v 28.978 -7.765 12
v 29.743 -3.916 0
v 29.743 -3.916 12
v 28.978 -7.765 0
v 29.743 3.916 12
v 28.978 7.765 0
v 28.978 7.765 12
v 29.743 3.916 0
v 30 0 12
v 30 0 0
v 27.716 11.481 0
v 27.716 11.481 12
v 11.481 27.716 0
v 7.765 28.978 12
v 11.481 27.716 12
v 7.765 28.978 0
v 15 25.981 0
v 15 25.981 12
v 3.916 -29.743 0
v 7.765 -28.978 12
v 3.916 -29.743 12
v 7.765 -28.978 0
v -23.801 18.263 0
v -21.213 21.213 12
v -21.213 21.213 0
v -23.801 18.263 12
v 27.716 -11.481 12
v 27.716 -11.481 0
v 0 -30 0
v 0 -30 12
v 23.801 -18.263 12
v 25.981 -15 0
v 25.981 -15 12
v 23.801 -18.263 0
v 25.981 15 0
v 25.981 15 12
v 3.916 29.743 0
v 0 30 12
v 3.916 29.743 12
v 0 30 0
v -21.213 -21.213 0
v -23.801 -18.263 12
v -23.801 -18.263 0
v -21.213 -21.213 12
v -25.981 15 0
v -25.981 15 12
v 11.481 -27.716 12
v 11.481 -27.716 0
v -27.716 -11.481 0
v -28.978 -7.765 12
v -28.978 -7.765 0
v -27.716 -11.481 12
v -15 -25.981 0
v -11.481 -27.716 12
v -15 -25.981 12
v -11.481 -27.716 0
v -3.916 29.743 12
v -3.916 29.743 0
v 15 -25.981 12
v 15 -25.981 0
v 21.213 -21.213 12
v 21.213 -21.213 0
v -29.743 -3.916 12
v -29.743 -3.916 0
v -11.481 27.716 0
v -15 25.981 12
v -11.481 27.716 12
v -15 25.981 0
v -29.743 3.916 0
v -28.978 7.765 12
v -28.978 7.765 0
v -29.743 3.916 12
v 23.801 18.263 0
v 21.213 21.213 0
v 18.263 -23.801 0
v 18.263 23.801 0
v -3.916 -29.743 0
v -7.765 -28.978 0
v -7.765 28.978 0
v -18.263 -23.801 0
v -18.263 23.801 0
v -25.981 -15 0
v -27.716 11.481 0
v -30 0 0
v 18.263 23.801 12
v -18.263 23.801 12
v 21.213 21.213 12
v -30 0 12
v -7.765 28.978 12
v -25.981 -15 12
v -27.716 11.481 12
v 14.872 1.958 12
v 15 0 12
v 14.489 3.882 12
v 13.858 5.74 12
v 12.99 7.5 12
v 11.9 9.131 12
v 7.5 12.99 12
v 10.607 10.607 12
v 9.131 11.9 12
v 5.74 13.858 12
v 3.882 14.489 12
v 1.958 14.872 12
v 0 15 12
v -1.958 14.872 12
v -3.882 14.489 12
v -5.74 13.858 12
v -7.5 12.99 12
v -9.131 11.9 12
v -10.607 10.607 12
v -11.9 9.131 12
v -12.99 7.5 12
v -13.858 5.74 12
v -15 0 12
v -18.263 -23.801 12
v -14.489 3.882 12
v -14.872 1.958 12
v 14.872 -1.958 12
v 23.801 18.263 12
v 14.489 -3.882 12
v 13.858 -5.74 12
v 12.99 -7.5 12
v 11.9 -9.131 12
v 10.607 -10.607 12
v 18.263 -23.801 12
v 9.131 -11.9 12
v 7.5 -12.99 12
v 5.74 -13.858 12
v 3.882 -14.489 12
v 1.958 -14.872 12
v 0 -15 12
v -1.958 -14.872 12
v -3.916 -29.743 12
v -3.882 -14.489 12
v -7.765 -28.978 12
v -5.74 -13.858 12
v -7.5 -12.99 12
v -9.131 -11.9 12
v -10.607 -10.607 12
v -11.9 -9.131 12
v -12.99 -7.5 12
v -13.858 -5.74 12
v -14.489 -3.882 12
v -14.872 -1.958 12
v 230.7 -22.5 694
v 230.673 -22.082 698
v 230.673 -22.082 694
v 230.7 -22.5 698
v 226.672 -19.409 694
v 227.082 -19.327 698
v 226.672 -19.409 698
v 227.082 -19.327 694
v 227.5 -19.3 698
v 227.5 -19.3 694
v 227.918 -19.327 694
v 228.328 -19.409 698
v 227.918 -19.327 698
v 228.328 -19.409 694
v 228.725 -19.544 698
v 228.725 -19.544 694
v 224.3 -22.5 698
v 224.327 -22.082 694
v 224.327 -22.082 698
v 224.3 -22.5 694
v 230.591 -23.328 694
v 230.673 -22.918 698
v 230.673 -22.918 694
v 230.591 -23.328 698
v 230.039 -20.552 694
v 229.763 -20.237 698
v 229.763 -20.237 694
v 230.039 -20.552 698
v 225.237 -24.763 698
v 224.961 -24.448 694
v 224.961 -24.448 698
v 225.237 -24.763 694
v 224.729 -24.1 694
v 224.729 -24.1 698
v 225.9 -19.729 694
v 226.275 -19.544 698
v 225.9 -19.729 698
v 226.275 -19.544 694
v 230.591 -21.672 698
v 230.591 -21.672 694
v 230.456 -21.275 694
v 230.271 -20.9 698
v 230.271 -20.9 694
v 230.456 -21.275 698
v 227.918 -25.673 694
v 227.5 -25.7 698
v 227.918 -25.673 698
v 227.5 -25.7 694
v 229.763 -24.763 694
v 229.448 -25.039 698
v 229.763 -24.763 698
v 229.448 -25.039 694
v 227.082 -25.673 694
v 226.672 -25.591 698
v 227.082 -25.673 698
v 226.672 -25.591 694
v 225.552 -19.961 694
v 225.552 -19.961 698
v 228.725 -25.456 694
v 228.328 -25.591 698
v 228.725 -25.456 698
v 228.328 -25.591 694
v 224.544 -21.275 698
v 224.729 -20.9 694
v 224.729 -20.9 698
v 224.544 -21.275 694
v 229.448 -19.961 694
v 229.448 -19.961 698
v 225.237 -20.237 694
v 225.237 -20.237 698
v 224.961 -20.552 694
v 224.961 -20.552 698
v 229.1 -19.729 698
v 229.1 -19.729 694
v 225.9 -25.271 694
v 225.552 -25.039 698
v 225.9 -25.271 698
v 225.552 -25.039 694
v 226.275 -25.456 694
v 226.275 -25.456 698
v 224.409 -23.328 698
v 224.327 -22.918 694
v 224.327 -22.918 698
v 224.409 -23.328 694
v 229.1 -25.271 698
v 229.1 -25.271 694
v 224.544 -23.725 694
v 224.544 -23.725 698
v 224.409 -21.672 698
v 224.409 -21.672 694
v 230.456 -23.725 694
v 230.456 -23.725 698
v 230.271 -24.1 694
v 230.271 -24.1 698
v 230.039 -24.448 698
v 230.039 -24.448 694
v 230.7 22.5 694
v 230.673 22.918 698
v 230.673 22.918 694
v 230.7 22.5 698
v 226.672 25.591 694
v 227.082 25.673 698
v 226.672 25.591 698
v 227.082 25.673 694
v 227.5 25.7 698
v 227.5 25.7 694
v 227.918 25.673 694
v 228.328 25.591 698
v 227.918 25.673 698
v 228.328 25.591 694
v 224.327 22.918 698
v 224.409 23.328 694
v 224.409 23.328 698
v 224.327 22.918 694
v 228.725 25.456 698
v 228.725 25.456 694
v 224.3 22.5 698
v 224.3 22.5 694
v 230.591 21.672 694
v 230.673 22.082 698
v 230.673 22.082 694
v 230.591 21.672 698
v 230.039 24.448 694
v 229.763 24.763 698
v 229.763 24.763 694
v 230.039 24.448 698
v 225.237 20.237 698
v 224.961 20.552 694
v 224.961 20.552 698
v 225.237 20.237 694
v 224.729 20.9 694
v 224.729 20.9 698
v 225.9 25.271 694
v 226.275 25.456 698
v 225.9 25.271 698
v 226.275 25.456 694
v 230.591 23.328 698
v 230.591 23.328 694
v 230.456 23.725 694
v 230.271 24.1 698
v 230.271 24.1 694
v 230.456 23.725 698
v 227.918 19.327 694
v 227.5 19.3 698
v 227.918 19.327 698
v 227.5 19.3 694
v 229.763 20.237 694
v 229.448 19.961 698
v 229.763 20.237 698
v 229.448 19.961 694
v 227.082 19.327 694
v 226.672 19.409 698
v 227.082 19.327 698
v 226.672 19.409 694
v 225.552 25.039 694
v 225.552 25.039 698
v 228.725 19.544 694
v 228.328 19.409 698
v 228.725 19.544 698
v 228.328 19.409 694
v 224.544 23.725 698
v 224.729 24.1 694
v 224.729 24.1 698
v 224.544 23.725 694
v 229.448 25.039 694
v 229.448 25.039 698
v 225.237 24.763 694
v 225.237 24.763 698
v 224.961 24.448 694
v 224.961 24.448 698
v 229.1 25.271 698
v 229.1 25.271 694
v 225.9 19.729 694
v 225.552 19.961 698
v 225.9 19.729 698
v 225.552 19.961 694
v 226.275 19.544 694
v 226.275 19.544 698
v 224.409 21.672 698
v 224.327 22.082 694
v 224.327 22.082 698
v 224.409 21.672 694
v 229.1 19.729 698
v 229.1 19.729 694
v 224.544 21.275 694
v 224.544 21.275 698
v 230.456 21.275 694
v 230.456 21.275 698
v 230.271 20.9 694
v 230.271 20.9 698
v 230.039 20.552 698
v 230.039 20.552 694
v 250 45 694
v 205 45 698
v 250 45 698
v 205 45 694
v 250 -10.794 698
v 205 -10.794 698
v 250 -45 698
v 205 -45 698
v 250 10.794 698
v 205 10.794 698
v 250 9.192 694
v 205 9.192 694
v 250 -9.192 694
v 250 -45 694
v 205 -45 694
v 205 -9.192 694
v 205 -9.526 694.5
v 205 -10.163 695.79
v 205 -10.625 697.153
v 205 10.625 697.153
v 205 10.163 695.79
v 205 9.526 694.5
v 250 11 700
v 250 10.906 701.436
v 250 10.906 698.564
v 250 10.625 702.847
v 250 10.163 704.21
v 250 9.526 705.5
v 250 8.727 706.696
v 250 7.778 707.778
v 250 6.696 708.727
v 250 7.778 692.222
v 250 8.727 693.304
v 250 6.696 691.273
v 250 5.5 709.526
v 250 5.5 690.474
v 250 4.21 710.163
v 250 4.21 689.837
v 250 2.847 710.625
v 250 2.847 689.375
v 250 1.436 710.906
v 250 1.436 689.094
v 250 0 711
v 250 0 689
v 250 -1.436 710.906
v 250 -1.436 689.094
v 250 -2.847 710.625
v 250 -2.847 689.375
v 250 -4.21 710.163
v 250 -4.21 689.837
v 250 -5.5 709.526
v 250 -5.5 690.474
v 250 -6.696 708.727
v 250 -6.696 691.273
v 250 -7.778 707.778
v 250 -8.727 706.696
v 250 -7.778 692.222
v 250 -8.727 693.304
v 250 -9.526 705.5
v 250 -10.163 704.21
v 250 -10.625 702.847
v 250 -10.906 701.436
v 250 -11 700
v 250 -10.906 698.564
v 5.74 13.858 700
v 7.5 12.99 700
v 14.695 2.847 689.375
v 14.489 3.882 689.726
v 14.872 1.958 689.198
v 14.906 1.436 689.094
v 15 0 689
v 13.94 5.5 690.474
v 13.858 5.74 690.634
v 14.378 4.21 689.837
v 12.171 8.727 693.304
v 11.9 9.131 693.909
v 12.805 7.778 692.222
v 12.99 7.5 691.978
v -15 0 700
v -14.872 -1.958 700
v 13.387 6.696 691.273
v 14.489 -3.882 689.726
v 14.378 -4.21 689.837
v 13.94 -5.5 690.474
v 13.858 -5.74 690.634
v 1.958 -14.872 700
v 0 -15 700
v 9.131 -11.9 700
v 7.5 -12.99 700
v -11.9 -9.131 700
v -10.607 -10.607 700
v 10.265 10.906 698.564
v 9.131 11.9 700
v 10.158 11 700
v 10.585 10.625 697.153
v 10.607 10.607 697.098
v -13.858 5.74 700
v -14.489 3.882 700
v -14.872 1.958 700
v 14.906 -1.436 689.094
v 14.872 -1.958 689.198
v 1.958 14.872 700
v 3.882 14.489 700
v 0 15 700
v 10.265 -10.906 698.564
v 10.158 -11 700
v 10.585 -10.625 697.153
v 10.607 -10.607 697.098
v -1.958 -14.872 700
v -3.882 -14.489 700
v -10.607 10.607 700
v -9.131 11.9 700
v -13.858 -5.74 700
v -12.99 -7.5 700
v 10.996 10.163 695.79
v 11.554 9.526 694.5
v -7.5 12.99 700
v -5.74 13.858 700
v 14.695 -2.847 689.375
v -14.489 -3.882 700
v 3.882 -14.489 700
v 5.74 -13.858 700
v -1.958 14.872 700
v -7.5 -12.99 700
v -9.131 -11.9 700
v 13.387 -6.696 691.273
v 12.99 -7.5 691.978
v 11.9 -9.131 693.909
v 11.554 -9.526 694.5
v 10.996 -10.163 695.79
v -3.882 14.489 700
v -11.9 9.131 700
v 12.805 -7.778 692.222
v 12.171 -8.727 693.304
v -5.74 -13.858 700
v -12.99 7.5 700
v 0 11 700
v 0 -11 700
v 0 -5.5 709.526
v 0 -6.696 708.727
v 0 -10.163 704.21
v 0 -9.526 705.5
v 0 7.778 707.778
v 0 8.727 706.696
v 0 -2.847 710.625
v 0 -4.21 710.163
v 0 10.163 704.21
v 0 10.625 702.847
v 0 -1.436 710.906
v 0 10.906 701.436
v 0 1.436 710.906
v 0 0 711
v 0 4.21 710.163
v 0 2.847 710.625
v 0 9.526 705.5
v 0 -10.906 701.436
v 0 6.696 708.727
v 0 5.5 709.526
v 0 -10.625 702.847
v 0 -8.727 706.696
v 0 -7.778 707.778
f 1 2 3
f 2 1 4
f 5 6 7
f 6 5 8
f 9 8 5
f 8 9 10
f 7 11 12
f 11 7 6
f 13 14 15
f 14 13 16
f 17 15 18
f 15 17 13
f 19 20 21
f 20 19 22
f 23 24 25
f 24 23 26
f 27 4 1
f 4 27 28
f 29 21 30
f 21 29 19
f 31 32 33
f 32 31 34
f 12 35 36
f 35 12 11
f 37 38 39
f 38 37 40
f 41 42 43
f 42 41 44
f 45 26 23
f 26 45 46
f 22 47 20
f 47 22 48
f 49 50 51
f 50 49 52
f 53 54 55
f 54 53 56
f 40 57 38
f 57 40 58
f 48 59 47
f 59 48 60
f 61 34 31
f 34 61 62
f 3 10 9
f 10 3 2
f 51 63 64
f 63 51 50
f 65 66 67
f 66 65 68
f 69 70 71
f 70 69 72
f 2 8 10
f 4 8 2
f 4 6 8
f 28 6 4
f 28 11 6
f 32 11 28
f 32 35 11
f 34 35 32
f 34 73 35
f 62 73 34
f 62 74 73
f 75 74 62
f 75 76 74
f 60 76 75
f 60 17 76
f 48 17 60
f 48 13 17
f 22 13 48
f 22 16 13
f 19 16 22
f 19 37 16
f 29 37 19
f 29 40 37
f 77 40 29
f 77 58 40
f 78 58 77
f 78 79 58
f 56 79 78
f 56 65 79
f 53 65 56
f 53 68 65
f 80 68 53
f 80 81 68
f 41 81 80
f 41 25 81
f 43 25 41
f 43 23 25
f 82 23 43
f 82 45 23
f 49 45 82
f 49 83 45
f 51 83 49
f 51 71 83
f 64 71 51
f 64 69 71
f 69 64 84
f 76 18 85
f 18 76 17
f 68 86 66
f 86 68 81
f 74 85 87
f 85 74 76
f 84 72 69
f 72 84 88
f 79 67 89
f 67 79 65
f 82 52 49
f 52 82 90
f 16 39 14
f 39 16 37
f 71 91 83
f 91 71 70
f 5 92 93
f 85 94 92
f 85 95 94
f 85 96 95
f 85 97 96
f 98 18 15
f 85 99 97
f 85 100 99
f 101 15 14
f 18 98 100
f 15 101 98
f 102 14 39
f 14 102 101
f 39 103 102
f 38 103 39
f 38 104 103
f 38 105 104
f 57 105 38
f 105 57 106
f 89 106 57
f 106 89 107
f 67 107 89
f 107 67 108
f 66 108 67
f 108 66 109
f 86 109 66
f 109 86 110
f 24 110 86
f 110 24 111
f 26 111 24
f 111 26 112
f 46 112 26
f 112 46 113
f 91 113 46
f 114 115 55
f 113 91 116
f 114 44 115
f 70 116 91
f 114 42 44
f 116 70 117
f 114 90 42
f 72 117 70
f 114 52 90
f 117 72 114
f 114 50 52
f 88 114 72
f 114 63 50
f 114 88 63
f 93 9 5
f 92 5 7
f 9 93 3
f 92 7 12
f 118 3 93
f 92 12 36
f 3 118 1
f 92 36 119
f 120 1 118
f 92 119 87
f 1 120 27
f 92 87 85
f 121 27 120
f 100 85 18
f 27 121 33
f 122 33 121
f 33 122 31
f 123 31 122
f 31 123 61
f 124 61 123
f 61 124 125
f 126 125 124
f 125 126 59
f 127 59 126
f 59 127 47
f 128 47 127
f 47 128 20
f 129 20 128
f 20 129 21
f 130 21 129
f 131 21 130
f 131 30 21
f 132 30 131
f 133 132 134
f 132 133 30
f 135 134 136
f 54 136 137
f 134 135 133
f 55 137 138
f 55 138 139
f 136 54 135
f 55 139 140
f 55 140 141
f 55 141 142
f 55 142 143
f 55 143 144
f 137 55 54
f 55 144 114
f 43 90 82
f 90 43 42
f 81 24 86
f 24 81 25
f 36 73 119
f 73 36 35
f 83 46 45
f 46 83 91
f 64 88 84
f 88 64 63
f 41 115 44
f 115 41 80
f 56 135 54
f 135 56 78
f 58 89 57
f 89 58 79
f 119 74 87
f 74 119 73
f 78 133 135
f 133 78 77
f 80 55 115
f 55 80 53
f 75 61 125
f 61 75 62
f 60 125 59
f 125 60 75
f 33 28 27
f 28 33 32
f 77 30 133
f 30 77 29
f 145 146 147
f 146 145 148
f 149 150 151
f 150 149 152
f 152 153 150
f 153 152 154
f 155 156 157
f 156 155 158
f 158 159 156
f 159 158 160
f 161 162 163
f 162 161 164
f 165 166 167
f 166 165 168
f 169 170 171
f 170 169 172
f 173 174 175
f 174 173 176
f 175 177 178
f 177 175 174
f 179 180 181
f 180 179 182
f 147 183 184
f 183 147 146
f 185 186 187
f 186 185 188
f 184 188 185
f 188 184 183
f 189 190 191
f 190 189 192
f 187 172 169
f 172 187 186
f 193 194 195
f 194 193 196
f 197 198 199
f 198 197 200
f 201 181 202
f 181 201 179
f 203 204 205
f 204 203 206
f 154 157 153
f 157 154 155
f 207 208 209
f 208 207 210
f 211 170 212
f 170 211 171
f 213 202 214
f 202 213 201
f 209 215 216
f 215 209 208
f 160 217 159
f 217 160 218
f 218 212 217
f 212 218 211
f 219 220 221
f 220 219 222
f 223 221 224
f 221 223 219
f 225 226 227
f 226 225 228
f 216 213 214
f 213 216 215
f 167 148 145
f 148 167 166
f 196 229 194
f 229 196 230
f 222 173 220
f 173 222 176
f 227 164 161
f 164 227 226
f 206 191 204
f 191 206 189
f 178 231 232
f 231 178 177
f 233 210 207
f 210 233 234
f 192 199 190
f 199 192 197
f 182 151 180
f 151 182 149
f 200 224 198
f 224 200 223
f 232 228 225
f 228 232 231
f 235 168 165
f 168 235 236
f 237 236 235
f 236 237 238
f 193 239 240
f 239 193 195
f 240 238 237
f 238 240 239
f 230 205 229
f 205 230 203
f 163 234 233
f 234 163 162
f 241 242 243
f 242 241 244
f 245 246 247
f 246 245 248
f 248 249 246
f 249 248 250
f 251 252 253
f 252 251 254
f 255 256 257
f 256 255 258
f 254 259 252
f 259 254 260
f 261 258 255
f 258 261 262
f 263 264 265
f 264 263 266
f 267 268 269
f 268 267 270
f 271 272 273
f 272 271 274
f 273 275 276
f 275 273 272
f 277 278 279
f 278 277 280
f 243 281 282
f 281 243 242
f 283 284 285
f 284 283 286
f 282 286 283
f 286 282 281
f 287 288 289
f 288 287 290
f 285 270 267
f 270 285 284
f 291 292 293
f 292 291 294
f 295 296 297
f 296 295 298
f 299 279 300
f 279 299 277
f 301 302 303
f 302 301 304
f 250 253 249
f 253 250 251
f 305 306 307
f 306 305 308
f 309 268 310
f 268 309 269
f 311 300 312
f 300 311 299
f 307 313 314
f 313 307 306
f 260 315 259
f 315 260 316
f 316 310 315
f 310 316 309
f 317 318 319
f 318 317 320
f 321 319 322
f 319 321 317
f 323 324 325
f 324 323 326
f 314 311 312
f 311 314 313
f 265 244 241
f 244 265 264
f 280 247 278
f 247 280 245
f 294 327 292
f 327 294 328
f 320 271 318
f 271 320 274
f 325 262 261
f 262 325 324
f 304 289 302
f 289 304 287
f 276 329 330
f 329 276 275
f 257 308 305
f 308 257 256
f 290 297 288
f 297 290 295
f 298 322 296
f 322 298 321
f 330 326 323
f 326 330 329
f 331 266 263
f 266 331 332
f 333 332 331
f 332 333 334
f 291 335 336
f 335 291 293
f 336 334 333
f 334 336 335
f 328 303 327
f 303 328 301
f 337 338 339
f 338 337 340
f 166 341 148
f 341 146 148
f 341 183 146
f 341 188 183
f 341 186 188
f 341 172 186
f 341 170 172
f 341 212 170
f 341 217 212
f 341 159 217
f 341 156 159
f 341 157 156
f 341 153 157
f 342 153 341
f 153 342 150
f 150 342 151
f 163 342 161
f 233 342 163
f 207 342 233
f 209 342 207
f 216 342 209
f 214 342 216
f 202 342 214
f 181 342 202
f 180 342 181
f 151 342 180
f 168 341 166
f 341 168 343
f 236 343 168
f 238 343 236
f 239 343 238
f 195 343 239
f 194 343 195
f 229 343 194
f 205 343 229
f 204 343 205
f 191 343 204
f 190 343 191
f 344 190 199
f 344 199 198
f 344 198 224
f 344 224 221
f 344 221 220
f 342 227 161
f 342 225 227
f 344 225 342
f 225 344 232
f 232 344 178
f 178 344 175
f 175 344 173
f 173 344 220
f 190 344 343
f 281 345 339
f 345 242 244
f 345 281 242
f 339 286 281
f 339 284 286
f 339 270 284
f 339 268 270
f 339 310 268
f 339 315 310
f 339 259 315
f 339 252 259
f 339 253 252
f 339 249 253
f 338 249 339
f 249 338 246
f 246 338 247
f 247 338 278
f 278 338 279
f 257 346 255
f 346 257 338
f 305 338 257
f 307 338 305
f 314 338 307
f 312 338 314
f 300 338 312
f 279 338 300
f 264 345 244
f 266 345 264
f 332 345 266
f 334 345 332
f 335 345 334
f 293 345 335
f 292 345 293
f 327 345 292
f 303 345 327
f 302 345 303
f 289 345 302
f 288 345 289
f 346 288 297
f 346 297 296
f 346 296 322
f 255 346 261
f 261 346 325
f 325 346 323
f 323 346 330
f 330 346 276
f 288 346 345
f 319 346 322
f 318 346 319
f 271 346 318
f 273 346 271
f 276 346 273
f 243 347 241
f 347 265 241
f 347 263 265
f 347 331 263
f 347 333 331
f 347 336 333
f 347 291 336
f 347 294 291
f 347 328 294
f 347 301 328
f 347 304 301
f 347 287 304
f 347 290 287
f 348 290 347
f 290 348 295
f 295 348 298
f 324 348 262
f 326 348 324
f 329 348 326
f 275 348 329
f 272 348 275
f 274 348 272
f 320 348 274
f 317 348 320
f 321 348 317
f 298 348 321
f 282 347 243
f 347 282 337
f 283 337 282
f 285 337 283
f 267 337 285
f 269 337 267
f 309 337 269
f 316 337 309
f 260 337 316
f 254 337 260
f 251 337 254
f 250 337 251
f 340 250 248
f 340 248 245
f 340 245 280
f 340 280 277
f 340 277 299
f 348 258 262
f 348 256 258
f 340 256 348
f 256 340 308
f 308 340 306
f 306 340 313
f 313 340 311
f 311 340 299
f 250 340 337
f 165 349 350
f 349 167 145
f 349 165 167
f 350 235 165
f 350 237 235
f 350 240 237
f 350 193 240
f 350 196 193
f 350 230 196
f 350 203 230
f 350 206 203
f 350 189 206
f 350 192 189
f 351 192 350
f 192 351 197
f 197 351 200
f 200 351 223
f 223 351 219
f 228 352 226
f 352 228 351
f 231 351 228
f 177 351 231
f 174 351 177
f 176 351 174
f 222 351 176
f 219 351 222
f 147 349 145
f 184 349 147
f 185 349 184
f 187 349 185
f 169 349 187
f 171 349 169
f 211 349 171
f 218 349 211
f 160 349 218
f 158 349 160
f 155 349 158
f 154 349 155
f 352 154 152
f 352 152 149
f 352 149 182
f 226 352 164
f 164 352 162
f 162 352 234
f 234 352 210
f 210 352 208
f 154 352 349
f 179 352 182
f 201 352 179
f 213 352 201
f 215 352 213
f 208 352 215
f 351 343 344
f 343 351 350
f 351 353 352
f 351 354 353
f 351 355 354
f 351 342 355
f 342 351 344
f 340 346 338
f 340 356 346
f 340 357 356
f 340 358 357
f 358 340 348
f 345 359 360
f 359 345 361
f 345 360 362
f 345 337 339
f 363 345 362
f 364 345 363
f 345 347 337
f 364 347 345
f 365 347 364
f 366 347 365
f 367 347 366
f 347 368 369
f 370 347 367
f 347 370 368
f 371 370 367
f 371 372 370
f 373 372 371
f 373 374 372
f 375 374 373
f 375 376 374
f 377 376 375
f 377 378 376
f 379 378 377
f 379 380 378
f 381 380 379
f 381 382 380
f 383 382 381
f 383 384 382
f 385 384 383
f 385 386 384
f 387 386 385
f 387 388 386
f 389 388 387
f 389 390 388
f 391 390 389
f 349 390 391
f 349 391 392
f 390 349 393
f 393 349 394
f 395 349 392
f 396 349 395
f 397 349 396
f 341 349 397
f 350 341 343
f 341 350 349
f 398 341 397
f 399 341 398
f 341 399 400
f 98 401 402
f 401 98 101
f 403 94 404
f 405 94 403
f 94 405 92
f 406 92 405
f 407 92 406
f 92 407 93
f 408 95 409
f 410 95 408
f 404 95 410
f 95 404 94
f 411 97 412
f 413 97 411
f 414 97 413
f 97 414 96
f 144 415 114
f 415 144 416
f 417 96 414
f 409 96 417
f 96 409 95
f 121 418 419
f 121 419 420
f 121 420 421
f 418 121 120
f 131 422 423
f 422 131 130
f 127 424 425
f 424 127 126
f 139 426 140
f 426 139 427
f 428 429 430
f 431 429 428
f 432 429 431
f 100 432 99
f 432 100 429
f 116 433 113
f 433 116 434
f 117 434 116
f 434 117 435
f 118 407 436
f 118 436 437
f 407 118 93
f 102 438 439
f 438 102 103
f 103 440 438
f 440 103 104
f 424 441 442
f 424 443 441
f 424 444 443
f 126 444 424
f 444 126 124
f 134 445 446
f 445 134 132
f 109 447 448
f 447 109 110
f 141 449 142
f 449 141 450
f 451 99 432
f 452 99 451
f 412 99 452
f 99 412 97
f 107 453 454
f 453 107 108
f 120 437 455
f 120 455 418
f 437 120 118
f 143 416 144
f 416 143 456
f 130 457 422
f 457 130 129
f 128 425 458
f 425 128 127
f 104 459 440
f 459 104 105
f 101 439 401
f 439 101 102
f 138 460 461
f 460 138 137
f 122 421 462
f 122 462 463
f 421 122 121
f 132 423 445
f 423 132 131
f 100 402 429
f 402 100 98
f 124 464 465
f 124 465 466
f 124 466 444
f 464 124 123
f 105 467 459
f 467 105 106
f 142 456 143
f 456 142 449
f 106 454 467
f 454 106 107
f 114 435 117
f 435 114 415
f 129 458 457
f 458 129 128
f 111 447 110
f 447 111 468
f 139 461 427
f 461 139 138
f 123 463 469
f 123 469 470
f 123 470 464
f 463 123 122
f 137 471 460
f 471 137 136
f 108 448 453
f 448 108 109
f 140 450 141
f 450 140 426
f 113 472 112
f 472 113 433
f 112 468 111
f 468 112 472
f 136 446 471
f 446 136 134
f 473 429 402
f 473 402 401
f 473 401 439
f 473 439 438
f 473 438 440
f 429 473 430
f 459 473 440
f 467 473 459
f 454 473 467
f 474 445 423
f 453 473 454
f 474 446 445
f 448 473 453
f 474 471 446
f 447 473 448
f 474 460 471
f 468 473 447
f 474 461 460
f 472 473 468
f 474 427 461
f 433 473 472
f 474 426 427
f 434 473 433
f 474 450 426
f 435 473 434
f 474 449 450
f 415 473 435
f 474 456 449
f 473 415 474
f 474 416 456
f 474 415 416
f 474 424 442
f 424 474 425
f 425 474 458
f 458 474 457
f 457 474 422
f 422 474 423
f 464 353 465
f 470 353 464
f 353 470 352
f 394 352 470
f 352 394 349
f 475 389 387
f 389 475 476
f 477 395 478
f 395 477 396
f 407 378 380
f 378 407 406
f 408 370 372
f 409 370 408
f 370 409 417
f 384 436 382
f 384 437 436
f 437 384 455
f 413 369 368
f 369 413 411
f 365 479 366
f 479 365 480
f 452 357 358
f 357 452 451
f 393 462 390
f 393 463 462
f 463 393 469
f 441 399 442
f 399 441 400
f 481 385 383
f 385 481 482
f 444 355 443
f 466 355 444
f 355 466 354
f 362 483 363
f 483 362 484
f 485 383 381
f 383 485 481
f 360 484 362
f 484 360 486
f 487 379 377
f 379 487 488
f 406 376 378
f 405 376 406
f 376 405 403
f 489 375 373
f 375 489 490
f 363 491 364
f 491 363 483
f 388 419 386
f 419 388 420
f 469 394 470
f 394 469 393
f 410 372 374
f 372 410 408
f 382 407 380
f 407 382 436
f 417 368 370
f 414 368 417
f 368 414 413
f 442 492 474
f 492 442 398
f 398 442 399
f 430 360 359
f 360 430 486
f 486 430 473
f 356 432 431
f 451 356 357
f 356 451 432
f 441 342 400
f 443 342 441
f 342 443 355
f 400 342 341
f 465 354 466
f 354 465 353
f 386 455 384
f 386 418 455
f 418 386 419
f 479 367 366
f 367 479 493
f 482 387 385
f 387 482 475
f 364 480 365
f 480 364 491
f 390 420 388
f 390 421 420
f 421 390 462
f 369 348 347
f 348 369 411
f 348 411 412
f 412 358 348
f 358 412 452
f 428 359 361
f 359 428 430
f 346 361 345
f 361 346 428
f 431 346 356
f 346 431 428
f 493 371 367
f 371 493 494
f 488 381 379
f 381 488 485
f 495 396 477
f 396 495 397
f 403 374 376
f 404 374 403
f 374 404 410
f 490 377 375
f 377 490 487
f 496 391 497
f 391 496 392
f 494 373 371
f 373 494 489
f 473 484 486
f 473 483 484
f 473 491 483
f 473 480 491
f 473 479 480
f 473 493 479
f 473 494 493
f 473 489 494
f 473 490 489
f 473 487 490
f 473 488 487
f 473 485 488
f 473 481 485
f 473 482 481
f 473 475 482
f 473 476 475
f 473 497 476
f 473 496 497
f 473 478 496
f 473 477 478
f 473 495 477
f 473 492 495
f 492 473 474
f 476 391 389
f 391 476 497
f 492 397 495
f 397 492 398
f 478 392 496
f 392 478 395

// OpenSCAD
// file: params.scad
// Foldbot — parámetros globales compartidos (todas las medidas en mm)
// Editar aquí para ajustar el diseño sin tocar la geometría.

// ---------- Brazo (ver docs/02-mecanica-brazo.md) ----------
arm_L1      = 150;   // eslabón hombro -> codo
arm_L2      = 120;   // eslabón codo -> muñeca
arm_L3      = 90;    // muñeca -> punta de la pinza
arm_base_h  = 70;    // altura de la base hasta el eje del hombro
arm_link_w  = 24;    // ancho de los eslabones
arm_link_t  = 8;     // espesor de pared de los eslabones
arm_base_d  = 90;    // diámetro de la base rotatoria
servo_len   = 40.5;  // caja de servo estándar (MG996R)
servo_w     = 20;
servo_h     = 38;

// Pose de ejemplo para el ensamble de referencia (grados)
pose_shoulder = 35;
pose_elbow    = -60;
pose_wrist    = -25;

// ---------- Tablero de plegado (ver docs/03-mecanica-plegado.md) ----------
board_center_w   = 200;  // ancho panel central
board_center_h   = 300;  // alto panel central
board_side_w     = 100;  // ancho de cada solapa lateral
board_bottom_h   = 150;  // alto de la solapa inferior
board_thickness  = 5;    // espesor de panel
board_hinge_gap  = 1.5;  // holgura de bisagra entre paneles

// ---------- Soporte de cámara (ver docs/01 y 05) ----------
cam_height        = 700;  // altura cenital sobre la mesa (60-80 cm)
cam_arm_len       = 250;  // voladizo del brazo de la cámara
cam_post_d        = 30;   // diámetro del poste
cam_plate_w       = 90;   // placa de montaje de la cámara (D435 ~90x25)
cam_plate_h       = 25;

// ---------- Calidad de render ----------
$fn = 48;
// main file
// Foldbot — Soporte cenital de la cámara RGB-D (modelo paramétrico)
// Poste vertical + brazo en voladizo + placa de montaje mirando hacia abajo.

include <params.scad>;

part = "full";  // "full" | "plate"

module post() {
    color("slategray") cylinder(h = cam_height, r = cam_post_d/2);
}

module foot() {
    color("dimgray")
    difference() {
        cylinder(h = 12, r = cam_post_d);
        translate([0, 0, -1]) cylinder(h = 14, r = cam_post_d/2 - 3);
    }
}

// Placa de montaje de la cámara (patrón de agujeros genérico tipo RealSense).
module cam_plate() {
    color("teal")
    difference() {
        cube([cam_plate_w, cam_plate_h + 20, 4]);
        // dos agujeros de 1/4" (~6.3 mm) y M3 auxiliares
        for (x = [cam_plate_w*0.25, cam_plate_w*0.75])
            translate([x, (cam_plate_h + 20)/2, -1]) cylinder(h = 6, r = 3.2);
        // ventana para el conector USB-C
        translate([cam_plate_w/2 - 8, cam_plate_h + 6, -1]) cube([16, 8, 6]);
    }
}

module camera_mount_full() {
    foot();
    post();
    // brazo en voladizo arriba
    translate([0, 0, cam_height])
        rotate([0, 90, 0])
            color("slategray") cylinder(h = cam_arm_len, r = cam_post_d/2 - 4);
    // placa mirando hacia abajo al final del voladizo
    translate([cam_arm_len, -cam_plate_w/2, cam_height - 6])
        rotate([0, 0, 90]) cam_plate();
}

if (part == "full")       camera_mount_full();
else if (part == "plate") cam_plate();
else camera_mount_full();
